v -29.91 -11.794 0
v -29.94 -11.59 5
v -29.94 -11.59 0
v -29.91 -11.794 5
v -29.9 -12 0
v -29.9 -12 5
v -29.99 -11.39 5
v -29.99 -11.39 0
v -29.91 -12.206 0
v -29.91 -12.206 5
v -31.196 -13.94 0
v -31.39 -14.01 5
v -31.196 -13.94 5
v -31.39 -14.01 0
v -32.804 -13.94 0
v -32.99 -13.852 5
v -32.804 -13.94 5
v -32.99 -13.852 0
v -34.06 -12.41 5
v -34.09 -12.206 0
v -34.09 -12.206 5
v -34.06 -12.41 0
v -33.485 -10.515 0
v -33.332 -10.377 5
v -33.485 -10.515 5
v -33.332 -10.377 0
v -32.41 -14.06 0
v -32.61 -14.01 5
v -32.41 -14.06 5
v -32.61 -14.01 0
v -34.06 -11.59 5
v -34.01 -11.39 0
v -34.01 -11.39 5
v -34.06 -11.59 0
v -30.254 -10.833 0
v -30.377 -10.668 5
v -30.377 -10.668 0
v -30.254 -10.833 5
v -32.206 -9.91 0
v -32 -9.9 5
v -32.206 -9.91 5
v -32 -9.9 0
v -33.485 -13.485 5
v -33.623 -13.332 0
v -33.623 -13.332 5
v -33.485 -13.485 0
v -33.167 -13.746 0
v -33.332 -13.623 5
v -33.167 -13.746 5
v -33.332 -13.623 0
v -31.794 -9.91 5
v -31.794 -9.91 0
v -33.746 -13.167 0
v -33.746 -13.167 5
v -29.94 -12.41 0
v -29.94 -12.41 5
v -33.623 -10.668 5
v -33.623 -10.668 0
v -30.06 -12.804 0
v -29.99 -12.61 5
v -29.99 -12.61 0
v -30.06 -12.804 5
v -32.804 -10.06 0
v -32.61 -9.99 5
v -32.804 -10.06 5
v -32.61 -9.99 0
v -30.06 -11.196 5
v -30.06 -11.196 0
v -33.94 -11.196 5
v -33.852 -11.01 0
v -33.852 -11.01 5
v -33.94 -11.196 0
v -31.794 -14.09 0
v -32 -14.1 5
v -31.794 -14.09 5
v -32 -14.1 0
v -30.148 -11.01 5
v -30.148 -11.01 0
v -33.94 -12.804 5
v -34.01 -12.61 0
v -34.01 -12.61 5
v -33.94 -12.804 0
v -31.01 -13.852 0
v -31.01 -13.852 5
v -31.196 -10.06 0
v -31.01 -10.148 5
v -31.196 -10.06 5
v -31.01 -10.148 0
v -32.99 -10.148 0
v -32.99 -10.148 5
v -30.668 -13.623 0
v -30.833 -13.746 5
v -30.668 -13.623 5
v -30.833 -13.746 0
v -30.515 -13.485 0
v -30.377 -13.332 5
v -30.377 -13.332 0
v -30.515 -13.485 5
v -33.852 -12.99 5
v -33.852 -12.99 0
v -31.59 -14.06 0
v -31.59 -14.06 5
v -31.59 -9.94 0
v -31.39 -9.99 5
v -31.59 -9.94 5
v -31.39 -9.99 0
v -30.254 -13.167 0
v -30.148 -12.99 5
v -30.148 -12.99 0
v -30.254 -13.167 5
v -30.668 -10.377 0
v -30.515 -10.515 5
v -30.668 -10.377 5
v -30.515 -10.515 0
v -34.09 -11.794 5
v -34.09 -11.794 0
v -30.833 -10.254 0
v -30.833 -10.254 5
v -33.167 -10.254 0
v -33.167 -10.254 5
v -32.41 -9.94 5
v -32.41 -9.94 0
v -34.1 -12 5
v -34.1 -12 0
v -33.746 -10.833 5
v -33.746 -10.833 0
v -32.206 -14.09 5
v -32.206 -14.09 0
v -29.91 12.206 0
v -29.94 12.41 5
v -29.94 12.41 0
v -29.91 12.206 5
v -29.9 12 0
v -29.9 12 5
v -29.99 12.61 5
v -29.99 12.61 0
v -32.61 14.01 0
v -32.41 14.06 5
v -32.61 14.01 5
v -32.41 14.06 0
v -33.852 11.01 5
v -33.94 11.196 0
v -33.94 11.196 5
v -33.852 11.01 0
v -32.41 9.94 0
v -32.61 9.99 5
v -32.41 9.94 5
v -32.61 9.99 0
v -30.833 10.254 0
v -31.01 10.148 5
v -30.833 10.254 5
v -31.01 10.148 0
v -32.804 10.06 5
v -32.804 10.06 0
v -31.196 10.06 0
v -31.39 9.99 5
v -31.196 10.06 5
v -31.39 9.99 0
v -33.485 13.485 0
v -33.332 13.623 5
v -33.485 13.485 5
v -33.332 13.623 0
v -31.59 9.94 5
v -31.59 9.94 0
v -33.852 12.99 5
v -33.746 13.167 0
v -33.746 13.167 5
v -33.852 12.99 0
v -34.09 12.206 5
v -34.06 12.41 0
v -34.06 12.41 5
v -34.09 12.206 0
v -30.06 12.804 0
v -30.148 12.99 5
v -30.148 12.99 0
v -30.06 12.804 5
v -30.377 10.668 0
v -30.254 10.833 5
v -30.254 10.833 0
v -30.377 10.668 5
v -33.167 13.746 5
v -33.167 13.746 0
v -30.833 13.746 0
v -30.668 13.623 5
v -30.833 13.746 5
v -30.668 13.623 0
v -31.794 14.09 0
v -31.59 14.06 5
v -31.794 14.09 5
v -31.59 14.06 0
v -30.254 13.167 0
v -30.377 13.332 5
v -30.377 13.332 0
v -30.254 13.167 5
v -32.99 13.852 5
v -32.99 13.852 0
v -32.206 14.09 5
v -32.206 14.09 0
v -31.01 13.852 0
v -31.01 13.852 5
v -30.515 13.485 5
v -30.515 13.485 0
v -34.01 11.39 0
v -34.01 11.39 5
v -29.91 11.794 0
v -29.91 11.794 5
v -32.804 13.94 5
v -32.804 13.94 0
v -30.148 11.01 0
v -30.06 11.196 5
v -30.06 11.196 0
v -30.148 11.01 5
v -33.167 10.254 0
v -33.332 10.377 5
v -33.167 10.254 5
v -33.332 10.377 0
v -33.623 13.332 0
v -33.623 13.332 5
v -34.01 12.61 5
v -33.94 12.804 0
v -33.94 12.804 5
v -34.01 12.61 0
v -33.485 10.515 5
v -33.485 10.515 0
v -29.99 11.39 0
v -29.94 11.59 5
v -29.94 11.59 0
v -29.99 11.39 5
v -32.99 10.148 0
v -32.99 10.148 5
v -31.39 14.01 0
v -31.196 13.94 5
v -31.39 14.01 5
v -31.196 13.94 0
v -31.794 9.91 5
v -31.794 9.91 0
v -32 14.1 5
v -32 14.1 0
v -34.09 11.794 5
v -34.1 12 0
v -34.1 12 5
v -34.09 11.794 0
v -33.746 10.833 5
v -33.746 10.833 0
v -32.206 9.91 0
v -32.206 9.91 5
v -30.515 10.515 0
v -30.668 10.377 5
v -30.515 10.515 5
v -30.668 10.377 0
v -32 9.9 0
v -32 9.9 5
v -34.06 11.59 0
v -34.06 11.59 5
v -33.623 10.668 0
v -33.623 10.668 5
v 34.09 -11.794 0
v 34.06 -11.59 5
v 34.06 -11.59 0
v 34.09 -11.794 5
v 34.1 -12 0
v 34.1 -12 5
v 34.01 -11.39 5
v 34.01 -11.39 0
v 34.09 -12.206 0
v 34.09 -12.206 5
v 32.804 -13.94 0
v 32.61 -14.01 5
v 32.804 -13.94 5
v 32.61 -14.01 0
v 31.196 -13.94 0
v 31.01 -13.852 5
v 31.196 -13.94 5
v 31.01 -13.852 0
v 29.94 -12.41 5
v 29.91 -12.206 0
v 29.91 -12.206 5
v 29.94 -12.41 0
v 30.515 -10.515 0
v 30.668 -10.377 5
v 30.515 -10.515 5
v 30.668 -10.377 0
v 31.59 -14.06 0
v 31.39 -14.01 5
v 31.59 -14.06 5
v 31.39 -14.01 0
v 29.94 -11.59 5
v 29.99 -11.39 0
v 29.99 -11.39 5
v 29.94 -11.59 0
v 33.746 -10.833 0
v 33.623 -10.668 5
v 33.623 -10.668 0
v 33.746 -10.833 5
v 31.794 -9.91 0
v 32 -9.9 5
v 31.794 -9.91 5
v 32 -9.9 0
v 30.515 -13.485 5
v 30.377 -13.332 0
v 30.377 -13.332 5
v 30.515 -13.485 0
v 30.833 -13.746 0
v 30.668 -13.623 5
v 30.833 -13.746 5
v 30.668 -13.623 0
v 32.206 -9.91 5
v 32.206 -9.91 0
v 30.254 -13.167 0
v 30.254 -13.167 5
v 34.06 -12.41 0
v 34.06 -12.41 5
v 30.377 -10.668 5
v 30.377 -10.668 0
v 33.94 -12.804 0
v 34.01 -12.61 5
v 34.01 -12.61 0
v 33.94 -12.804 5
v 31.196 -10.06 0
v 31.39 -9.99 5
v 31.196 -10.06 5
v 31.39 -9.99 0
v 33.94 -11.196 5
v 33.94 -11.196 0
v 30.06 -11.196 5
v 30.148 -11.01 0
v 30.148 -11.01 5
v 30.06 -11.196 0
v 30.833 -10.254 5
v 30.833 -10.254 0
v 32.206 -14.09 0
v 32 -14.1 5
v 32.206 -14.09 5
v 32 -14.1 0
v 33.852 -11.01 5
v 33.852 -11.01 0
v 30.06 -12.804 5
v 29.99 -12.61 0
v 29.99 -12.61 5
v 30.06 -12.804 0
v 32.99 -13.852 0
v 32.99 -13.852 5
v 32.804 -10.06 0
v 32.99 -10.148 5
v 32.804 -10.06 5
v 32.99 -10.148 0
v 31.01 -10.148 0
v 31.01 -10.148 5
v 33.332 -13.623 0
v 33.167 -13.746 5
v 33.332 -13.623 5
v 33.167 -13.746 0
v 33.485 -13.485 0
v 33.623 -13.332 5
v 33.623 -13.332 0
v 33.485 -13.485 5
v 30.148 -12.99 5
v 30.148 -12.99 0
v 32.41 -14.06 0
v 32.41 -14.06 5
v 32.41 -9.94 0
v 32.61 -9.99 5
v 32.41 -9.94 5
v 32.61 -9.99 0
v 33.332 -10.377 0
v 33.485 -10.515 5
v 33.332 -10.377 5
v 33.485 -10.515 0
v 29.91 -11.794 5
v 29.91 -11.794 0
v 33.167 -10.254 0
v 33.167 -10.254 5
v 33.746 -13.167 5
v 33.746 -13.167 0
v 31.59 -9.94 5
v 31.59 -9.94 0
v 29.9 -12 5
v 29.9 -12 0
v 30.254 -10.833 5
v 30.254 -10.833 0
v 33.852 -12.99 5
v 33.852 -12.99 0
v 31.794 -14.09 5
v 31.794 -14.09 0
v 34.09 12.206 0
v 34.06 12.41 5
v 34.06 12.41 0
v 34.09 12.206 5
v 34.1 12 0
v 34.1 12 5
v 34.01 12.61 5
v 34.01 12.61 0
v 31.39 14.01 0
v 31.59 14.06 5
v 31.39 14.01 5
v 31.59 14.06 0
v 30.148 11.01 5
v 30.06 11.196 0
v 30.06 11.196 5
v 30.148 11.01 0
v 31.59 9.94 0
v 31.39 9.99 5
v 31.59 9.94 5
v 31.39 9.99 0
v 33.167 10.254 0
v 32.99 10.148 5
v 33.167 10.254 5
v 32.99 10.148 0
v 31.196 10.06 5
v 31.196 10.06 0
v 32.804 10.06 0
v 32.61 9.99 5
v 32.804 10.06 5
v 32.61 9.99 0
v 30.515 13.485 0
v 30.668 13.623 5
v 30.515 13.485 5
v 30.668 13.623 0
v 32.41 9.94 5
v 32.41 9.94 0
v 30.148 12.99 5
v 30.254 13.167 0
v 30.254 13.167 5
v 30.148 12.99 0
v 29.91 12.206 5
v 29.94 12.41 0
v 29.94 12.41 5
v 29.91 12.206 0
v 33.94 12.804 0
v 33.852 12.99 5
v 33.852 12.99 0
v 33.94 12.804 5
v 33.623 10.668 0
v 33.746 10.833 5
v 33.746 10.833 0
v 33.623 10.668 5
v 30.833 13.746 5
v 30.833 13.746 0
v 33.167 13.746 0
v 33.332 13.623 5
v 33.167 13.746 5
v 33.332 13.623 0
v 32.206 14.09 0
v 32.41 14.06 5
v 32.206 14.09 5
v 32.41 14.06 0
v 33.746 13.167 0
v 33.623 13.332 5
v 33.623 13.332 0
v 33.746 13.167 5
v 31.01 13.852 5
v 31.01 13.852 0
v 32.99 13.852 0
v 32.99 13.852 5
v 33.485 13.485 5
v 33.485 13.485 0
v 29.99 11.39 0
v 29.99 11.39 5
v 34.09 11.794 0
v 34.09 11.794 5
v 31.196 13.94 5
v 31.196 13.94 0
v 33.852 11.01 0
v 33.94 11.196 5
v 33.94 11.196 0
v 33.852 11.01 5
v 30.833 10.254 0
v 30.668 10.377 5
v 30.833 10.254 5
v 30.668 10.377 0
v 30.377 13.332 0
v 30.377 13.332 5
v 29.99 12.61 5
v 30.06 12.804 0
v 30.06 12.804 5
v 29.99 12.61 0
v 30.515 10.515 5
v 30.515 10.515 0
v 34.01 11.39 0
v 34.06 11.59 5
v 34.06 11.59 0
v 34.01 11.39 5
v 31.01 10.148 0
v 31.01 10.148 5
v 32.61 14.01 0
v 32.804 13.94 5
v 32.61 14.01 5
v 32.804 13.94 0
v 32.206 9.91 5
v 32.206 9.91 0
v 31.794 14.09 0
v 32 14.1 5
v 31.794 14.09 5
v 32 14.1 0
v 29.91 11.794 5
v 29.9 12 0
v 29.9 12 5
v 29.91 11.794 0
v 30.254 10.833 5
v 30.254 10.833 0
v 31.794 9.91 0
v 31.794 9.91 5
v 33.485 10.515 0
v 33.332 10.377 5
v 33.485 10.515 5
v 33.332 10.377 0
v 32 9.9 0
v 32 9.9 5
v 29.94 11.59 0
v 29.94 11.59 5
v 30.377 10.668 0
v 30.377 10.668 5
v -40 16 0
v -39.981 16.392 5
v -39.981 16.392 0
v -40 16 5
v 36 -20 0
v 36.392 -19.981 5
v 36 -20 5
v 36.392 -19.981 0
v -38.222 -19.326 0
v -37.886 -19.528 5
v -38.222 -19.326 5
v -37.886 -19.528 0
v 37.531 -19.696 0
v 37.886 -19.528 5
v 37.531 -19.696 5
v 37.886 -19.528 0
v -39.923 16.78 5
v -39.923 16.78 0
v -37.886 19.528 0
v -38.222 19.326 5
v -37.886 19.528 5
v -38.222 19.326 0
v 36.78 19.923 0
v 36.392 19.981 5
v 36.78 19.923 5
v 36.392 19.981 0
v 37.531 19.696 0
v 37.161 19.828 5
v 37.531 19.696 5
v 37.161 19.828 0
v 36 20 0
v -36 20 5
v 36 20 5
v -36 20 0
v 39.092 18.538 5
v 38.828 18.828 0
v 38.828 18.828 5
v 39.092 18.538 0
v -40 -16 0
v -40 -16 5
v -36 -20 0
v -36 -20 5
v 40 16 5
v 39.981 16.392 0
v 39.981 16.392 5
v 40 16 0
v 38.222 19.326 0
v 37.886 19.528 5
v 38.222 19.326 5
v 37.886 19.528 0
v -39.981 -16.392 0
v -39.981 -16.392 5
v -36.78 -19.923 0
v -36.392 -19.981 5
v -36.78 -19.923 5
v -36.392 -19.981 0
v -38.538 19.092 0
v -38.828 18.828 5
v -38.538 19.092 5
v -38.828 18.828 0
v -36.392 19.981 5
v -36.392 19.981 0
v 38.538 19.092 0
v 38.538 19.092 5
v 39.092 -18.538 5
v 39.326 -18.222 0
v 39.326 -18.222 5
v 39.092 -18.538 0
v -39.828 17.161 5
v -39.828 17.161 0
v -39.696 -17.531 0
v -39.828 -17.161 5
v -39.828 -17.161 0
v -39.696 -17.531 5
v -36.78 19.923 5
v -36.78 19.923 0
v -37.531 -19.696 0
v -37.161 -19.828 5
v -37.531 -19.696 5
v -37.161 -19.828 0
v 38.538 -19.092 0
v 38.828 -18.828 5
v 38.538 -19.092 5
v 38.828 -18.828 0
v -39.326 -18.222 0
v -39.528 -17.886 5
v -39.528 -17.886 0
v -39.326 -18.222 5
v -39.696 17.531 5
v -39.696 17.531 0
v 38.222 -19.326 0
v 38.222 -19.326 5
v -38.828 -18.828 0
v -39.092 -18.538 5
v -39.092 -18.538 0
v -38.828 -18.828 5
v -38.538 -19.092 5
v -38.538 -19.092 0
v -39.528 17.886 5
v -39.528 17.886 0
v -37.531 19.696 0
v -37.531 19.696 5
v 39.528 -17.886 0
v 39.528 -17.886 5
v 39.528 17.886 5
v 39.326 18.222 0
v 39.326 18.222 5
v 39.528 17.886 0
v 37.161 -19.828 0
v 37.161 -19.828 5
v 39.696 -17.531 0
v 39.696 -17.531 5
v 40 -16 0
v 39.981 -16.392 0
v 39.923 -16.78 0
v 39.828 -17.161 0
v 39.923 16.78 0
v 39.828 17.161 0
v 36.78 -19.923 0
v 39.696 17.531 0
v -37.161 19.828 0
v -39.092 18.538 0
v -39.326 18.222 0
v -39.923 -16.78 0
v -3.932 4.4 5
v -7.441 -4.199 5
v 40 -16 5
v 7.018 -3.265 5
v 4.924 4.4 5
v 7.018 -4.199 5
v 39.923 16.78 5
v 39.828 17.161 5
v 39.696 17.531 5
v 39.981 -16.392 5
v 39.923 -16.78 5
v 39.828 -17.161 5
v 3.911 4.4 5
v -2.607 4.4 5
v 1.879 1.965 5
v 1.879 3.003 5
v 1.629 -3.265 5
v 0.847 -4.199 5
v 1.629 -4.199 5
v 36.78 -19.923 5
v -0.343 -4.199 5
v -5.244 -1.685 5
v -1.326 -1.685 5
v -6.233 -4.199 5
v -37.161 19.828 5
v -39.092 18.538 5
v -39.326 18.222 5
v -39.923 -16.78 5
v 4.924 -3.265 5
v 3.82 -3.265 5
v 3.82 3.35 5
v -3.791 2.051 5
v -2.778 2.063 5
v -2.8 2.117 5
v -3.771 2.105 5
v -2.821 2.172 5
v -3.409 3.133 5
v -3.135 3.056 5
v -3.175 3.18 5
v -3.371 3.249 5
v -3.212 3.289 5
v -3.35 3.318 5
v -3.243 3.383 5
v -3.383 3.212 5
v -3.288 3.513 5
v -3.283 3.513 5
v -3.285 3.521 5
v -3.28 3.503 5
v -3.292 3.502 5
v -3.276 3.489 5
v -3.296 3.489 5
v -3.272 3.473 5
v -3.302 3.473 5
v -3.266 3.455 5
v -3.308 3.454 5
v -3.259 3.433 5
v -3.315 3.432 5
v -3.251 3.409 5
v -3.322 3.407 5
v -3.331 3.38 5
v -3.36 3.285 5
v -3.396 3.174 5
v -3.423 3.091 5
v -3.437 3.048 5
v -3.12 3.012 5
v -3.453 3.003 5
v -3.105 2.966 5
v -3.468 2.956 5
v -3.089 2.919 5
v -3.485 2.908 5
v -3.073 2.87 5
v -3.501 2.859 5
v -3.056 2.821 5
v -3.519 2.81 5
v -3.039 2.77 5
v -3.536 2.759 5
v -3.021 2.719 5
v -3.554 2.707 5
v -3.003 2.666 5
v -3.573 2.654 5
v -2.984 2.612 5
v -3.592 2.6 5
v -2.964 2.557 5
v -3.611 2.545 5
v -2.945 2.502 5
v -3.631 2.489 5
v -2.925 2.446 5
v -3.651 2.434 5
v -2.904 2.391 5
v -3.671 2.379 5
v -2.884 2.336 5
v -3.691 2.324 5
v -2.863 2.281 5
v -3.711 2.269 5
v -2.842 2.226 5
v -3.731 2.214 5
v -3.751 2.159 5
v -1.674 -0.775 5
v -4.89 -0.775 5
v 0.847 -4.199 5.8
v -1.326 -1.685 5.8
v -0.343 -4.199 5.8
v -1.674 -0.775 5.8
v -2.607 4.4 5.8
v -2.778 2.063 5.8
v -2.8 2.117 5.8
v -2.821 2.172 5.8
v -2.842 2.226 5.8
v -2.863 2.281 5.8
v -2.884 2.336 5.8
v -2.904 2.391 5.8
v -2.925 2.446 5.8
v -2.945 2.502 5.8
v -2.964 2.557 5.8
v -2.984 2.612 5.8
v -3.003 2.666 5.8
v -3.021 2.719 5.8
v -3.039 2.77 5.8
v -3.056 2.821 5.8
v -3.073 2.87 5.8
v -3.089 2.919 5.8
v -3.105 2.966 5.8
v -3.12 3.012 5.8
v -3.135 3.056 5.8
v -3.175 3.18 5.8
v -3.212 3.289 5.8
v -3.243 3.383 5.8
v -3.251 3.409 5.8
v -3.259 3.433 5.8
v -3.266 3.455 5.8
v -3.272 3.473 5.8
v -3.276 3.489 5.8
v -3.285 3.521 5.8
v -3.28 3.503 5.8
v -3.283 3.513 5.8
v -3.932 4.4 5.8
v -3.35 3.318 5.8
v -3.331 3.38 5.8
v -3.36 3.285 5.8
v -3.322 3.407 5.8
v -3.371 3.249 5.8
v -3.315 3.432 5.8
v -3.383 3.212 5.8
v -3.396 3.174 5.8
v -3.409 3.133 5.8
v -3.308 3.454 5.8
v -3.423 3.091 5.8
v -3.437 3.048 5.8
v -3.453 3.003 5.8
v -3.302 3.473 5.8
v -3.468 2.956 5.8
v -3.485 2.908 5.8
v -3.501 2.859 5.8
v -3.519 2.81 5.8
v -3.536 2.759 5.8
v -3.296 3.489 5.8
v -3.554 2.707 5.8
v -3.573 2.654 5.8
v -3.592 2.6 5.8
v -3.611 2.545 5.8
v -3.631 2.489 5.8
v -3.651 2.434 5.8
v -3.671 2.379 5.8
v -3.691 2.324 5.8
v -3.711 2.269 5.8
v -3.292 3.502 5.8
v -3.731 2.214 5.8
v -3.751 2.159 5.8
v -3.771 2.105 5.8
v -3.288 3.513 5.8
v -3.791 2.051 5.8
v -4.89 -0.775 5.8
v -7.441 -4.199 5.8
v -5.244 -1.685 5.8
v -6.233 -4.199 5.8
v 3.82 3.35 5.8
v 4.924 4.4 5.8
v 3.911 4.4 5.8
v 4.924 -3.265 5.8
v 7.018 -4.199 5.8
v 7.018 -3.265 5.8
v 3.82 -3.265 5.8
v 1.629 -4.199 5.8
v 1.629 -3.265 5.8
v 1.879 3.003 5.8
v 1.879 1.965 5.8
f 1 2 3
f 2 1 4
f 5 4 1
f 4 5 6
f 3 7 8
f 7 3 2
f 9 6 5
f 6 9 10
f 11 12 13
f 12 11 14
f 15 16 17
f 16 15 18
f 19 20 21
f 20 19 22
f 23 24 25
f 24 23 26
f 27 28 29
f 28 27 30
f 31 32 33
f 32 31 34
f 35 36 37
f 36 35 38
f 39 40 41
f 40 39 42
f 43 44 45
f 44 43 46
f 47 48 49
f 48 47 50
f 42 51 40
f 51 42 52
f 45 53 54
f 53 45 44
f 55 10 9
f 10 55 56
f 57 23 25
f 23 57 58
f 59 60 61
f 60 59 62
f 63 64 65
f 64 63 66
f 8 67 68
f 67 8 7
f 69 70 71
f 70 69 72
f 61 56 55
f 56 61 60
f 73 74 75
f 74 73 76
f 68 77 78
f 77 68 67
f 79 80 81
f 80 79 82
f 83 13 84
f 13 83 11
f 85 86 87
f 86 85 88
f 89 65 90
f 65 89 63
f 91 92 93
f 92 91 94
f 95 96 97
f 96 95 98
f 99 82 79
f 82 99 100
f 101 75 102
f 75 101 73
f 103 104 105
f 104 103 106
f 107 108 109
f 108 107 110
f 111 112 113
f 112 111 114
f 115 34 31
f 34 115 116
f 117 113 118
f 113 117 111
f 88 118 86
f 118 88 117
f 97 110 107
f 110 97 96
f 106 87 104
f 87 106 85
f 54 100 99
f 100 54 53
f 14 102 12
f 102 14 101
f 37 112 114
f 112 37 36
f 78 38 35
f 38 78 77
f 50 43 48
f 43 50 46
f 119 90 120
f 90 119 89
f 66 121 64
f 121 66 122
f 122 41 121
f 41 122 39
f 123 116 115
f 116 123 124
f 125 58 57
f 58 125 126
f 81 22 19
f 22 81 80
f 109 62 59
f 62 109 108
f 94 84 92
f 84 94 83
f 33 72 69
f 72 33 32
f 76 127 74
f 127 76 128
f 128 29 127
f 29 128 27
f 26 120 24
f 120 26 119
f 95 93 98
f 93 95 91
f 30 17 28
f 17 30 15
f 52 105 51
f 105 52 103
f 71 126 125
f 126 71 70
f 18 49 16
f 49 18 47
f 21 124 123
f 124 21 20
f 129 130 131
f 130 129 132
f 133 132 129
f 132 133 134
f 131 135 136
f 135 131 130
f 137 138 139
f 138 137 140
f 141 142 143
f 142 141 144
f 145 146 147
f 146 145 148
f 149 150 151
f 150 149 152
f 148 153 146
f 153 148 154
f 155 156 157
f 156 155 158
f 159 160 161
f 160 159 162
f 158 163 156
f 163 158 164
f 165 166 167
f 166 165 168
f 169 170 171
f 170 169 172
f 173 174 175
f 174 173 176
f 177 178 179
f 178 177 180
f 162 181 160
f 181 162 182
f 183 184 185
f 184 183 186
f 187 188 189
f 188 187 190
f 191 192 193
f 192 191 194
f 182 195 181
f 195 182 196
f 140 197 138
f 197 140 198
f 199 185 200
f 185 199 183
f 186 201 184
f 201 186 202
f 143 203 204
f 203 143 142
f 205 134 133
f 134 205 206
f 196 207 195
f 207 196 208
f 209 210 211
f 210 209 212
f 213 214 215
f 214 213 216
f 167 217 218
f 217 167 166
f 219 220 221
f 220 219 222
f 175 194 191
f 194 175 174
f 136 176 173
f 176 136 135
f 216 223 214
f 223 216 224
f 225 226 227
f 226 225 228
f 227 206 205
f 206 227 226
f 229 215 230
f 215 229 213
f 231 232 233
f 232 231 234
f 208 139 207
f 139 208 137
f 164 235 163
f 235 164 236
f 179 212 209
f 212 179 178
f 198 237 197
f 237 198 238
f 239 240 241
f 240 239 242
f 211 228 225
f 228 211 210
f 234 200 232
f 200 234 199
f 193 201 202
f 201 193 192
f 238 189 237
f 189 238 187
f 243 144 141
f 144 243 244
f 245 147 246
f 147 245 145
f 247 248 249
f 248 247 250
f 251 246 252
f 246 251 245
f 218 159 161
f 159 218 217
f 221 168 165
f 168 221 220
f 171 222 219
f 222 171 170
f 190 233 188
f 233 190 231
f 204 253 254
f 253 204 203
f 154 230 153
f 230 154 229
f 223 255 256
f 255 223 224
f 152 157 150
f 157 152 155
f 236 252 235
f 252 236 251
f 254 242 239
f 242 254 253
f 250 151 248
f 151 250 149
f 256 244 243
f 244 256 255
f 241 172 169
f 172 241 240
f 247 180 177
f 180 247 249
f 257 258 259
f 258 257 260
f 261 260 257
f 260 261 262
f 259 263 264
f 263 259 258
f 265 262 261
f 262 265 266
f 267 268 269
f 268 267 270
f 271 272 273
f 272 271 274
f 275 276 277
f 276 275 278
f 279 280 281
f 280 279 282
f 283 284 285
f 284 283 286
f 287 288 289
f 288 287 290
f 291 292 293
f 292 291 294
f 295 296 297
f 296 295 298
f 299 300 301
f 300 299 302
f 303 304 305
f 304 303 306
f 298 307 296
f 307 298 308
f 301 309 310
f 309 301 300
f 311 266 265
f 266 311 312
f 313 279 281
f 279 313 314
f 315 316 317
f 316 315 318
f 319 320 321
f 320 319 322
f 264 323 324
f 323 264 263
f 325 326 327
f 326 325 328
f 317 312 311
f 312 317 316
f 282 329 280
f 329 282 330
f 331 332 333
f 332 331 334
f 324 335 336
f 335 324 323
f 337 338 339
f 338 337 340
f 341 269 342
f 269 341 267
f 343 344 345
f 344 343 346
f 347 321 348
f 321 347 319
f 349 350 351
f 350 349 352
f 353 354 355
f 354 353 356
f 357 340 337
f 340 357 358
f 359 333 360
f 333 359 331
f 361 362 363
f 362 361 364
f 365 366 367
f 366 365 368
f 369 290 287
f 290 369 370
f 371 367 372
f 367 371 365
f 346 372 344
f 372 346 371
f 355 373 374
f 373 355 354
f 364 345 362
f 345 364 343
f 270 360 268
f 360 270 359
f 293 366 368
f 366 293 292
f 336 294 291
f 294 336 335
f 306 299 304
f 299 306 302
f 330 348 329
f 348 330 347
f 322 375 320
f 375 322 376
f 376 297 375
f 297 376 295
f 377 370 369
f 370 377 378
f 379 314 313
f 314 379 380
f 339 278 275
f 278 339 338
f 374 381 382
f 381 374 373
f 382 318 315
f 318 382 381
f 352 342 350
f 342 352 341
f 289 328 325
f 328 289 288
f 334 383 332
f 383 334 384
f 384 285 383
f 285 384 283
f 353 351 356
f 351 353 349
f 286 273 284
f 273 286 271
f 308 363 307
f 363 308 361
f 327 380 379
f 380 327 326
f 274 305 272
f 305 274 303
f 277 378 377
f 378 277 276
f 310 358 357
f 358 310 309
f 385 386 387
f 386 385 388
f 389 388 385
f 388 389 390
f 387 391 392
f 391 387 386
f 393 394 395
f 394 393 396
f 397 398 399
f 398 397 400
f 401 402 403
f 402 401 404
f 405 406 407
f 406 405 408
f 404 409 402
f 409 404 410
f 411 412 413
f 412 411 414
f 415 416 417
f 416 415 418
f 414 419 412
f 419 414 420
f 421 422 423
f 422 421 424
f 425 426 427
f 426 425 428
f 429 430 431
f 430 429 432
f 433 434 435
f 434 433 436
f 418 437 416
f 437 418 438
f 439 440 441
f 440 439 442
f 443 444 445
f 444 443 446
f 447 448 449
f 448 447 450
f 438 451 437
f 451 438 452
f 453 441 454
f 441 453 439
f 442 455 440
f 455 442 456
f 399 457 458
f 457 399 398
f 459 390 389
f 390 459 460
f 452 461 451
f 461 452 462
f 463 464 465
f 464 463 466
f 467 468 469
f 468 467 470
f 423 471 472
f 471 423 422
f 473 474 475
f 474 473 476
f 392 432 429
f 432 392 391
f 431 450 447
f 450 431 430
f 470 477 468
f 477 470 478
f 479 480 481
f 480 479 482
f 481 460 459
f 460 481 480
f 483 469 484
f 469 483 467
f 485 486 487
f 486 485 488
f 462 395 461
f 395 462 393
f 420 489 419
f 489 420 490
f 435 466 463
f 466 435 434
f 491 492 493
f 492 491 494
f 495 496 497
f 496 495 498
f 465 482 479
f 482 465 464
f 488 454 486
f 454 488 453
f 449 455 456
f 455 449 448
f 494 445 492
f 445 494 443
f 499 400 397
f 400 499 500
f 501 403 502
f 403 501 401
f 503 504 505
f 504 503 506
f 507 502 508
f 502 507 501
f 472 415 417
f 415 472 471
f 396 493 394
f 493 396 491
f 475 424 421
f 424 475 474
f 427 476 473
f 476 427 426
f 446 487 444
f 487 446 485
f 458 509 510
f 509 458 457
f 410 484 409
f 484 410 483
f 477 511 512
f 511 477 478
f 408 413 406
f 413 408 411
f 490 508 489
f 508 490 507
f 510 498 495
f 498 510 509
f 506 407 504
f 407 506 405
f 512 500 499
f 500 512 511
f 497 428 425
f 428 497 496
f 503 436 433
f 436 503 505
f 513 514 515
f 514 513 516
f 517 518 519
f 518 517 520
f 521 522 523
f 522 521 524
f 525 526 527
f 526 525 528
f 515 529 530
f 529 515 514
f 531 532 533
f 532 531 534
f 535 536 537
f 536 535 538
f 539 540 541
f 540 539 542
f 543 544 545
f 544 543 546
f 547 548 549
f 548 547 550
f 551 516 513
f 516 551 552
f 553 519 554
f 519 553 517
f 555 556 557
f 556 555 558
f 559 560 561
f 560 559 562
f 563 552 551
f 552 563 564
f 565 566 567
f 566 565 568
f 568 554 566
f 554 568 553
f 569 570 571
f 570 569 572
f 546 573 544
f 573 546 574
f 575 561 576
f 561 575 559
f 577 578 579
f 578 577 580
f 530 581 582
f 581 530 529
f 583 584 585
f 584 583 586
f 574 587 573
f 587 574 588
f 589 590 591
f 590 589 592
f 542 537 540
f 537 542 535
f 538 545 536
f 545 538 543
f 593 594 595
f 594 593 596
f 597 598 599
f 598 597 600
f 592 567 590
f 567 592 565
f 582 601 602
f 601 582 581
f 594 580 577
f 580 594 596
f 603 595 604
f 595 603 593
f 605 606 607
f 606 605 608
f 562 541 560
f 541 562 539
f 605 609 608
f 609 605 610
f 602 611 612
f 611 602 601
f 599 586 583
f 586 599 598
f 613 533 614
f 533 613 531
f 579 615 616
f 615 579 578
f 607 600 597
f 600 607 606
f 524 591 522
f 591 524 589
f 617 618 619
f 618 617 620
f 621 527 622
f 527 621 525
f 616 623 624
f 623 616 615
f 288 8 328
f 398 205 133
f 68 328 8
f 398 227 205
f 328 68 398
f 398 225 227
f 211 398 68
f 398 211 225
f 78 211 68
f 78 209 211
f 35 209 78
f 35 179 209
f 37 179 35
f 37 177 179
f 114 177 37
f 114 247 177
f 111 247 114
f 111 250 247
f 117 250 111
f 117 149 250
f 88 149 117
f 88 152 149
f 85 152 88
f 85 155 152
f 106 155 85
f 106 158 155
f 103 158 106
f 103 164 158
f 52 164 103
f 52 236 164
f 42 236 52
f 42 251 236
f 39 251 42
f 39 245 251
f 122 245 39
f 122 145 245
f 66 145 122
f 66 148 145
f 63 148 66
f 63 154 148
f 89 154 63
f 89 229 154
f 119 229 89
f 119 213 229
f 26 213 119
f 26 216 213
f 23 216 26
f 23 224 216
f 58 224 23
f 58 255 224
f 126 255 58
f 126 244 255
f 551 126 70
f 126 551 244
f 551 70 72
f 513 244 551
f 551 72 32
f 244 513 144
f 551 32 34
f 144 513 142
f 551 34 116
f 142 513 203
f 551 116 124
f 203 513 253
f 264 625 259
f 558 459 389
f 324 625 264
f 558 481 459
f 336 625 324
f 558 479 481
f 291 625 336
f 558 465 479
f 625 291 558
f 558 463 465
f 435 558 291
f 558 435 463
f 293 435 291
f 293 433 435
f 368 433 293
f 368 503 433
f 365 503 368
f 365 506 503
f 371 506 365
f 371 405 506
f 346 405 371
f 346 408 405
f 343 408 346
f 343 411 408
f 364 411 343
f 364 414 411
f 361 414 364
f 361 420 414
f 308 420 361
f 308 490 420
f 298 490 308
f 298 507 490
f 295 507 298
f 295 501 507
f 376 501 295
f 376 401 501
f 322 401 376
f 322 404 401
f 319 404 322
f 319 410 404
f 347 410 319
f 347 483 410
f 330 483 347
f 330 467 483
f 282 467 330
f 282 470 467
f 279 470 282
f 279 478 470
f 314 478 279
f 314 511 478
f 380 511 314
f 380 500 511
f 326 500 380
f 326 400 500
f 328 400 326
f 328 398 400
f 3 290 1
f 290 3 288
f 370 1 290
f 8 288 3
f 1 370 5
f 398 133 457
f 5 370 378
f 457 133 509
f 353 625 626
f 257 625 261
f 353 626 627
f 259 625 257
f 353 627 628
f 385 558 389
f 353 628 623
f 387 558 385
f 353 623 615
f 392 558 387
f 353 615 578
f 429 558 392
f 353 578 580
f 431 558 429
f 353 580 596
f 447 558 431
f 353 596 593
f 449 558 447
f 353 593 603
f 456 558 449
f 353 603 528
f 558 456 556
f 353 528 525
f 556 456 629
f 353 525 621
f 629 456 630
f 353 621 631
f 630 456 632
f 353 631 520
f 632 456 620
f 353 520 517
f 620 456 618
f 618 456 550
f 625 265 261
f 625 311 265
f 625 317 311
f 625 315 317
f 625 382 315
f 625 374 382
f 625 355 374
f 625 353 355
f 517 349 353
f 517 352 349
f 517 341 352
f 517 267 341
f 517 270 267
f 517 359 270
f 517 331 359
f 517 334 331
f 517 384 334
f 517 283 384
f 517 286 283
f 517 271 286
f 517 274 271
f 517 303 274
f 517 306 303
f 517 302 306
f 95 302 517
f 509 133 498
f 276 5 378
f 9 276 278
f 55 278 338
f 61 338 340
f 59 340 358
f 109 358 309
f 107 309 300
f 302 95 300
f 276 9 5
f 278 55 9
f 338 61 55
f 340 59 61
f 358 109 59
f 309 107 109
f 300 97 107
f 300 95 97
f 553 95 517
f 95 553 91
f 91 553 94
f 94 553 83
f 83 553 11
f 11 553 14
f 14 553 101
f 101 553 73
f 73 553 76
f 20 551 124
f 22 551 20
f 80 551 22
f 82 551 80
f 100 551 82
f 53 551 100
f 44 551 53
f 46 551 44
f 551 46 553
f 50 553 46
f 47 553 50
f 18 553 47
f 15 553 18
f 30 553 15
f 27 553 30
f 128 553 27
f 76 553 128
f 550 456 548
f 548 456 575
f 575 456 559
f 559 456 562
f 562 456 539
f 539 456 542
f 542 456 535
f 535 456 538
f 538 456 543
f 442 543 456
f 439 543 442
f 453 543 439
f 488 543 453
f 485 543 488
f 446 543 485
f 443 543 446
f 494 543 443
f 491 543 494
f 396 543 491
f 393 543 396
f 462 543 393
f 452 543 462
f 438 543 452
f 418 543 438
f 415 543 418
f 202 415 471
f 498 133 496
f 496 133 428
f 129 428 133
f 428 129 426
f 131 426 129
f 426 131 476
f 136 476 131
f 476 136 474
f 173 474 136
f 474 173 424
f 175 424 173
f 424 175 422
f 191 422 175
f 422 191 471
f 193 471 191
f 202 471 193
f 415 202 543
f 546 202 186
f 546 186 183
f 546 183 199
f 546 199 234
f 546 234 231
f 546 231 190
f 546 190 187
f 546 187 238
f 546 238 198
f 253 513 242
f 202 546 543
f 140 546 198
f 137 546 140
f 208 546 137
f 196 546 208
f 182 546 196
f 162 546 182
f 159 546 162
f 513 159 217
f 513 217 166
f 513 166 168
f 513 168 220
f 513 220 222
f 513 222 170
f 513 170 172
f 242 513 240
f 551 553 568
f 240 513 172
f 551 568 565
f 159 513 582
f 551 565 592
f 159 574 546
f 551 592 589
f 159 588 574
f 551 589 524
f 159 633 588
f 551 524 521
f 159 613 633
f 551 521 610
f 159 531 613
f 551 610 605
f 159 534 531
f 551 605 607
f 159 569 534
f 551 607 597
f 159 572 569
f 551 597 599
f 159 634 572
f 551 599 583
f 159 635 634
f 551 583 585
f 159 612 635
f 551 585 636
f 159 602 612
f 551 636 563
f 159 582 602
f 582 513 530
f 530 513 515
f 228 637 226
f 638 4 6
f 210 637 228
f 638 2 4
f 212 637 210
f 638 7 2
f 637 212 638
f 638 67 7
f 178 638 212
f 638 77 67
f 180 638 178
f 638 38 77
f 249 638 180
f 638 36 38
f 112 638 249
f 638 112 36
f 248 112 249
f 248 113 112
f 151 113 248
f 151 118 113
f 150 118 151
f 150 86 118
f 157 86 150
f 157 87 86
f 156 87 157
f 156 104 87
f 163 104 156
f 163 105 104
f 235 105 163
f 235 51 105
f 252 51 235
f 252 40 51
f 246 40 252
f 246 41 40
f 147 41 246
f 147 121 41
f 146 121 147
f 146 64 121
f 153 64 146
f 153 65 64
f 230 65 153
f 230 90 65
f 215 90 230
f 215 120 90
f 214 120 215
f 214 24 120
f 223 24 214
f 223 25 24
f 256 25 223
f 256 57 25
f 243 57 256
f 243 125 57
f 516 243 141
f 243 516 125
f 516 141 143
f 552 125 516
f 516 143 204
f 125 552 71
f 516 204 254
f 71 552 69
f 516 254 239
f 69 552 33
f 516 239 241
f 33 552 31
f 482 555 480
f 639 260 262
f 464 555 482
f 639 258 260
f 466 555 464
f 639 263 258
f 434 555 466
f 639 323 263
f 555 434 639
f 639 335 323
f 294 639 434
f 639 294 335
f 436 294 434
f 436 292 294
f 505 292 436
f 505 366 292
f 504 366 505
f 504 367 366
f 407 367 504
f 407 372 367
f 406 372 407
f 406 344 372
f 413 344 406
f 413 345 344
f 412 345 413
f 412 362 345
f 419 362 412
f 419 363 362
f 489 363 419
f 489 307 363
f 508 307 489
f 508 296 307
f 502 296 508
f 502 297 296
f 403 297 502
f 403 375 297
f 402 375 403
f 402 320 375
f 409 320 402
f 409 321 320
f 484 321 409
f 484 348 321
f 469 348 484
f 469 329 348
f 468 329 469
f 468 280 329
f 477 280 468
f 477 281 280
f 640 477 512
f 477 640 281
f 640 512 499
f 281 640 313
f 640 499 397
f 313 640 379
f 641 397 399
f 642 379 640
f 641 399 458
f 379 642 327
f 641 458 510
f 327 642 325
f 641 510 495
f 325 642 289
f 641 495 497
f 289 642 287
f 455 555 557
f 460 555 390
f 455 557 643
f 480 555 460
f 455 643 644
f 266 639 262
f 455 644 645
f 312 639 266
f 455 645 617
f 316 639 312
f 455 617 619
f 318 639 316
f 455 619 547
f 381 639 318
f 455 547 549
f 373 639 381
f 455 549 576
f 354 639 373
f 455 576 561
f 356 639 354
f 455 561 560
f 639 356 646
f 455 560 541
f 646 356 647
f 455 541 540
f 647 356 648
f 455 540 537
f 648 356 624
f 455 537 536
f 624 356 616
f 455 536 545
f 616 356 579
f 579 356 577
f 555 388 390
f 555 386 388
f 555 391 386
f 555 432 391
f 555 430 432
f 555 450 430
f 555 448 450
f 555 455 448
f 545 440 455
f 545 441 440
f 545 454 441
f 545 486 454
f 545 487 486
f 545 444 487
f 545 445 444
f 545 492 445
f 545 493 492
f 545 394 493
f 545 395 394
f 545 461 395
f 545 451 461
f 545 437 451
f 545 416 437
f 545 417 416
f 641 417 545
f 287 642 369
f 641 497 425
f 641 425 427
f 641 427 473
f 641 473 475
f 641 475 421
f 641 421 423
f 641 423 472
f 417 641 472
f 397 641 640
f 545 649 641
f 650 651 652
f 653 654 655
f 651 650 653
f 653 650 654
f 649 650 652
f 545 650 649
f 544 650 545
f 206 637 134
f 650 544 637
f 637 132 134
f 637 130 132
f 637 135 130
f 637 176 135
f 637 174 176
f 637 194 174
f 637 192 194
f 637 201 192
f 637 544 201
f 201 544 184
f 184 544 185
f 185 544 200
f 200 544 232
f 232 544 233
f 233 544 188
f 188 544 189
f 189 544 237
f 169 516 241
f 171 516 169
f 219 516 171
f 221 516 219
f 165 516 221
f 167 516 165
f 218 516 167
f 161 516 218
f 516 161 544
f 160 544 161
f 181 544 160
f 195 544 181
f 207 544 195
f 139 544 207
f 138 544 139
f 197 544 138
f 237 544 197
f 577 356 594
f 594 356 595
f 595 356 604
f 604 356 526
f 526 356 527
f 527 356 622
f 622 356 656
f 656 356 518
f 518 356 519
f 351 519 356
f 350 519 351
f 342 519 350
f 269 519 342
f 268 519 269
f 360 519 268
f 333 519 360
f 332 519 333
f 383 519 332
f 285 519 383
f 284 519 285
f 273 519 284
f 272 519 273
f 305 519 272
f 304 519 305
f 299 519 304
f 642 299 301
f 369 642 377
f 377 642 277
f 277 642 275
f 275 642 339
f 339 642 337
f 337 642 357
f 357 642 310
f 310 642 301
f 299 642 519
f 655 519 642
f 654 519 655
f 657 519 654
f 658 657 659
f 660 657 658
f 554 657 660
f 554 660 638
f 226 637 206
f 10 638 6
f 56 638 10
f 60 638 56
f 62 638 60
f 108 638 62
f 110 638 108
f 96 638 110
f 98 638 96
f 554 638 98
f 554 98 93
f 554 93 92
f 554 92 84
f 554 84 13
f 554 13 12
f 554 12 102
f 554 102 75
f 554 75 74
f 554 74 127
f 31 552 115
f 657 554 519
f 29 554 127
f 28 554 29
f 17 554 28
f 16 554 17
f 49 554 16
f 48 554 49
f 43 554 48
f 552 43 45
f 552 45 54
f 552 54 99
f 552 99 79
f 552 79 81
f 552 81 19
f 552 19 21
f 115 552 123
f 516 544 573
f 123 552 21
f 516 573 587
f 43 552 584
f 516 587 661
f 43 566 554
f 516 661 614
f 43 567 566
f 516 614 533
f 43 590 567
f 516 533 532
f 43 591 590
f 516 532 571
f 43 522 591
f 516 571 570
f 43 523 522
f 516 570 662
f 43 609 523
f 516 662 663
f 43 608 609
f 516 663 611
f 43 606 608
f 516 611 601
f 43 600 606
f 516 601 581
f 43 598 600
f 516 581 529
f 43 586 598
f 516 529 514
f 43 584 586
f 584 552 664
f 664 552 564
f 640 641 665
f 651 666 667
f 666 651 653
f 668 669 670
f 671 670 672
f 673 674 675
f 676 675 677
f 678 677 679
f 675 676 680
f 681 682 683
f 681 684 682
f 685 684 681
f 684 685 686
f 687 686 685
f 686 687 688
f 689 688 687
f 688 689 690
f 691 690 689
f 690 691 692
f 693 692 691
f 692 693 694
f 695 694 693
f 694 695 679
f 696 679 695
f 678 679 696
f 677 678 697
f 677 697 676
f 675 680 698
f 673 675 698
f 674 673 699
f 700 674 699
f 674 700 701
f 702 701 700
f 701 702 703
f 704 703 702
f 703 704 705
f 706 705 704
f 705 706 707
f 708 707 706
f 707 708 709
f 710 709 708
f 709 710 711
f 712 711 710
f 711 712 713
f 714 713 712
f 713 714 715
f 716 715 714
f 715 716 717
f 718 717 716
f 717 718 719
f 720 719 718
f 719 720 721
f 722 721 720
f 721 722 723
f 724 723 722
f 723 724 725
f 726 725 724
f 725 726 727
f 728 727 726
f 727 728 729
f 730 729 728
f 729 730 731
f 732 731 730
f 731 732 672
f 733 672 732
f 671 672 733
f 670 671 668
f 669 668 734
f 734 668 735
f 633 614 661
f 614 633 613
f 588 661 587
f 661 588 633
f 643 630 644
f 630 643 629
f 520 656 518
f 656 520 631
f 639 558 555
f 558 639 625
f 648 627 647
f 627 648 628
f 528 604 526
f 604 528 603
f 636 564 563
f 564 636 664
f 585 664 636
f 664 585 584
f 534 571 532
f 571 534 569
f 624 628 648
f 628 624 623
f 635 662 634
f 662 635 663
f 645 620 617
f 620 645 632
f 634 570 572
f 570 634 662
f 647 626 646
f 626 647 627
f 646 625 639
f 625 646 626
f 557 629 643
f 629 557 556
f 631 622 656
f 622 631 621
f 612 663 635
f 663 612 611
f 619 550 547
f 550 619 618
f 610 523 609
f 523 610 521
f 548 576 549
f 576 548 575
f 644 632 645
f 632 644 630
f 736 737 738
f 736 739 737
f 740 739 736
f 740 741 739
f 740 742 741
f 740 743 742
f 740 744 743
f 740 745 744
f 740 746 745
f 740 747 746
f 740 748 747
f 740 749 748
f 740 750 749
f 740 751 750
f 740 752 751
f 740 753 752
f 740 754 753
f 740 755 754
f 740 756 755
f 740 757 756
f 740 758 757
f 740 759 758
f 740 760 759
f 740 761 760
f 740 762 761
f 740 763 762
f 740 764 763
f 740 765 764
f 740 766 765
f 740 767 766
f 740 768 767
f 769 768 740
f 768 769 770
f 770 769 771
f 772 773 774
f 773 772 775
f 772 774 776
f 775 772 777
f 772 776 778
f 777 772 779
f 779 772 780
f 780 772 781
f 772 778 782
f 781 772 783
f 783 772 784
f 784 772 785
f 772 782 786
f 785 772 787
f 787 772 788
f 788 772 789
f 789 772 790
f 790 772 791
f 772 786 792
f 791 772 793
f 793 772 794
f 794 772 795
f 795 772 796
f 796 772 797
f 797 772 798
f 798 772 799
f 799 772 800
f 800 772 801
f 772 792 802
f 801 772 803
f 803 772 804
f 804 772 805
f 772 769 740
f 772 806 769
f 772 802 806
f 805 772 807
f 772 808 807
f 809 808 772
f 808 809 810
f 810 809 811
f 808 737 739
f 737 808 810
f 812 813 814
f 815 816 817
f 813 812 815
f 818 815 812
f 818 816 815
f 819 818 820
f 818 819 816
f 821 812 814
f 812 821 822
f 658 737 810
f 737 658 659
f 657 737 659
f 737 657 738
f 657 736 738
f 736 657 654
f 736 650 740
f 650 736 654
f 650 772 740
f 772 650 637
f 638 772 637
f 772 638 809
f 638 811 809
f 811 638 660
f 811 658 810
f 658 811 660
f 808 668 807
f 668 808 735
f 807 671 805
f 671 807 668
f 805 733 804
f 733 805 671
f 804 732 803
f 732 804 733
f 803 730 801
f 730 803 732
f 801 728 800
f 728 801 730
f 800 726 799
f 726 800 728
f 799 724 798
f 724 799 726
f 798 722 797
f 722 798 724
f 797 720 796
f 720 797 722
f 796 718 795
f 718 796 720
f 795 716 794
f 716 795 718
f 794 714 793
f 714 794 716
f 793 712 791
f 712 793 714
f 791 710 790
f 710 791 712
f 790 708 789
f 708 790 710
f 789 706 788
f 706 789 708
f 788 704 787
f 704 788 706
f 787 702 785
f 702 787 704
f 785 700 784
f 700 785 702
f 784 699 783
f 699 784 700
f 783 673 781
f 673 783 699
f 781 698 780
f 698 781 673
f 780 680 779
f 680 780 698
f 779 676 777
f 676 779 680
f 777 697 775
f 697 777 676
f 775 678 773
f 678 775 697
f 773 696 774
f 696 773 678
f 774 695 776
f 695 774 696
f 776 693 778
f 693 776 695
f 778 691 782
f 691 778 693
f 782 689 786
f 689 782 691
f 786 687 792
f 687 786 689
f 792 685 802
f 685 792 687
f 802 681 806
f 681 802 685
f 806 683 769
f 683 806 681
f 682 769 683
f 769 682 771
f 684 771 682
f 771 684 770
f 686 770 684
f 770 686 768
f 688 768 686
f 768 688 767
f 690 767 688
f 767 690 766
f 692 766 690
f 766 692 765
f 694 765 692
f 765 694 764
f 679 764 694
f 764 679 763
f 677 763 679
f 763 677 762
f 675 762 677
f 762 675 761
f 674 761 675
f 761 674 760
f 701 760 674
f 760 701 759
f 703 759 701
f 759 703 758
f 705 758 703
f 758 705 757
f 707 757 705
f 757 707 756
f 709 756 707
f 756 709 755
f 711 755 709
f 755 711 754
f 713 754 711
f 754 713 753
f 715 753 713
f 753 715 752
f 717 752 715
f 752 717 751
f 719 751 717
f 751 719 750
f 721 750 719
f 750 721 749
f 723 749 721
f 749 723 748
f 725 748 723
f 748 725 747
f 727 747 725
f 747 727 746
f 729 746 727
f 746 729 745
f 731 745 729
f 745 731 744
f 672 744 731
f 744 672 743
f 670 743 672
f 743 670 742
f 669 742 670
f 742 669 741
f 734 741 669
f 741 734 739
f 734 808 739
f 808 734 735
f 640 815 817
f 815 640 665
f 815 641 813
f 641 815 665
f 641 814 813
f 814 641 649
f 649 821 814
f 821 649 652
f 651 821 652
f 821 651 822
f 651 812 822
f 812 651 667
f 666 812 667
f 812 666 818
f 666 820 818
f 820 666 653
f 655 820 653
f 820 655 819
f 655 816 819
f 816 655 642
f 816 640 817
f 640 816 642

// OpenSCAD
/*
Model: Example rounded mounting plate with four through holes and raised label
Units: millimetres
Export: Render (F6), then export STL/3MF
*/

/* [Dimensions] */
plate_w = 80; // [20:1:200]
plate_d = 40; // [20:1:200]
plate_t = 5; // [1:0.5:30]
corner_r = 4; // [0:0.5:20]

/* [Holes] */
hole_d = 4.2; // [1:0.1:20]
hole_inset = 8; // [3:0.5:40]

/* [Label] */
add_label = true;
label_text = "A1";
label_size = 9; // [4:1:30]
label_height = 0.8; // [0.2:0.1:3]

/* [Hidden] */
eps = 0.01;
$fn = 64;

safe_corner_r = min(corner_r, min(plate_w, plate_d) / 2 - eps);

assert(plate_w > 0, "plate_w must be positive");
assert(plate_d > 0, "plate_d must be positive");
assert(plate_t > 0, "plate_t must be positive");
assert(hole_d > 0, "hole_d must be positive");
assert(hole_inset > hole_d / 2, "hole_inset must keep holes inside plate");
assert(plate_w > 2 * hole_inset, "plate_w too small for hole_inset");
assert(plate_d > 2 * hole_inset, "plate_d too small for hole_inset");
assert(safe_corner_r >= 0, "corner_r too large for plate dimensions");
assert(label_height > 0, "label_height must be positive");

module rounded_rect_2d(w, d, r) {
    if (r <= eps)
        square([w, d], center = true);
    else
        offset(r = r)
            offset(delta = -r)
                square([w, d], center = true);
}

module plate_body() {
    linear_extrude(height = plate_t)
        rounded_rect_2d(plate_w, plate_d, safe_corner_r);
}

module four_corner_positions() {
    for (x = [-plate_w / 2 + hole_inset, plate_w / 2 - hole_inset])
    for (y = [-plate_d / 2 + hole_inset, plate_d / 2 - hole_inset])
        translate([x, y, 0])
            children();
}

module hole_cutters() {
    four_corner_positions()
        translate([0, 0, -eps])
            cylinder(h = plate_t + 2 * eps, d = hole_d);
}

module raised_label() {
    translate([0, 0, plate_t - eps])
        linear_extrude(height = label_height + eps)
            text(label_text, size = label_size, halign = "center", valign = "center");
}

module model() {
    union() {
        difference() {
            plate_body();
            hole_cutters();
        }
        if (add_label)
            raised_label();
    }
}

model();
